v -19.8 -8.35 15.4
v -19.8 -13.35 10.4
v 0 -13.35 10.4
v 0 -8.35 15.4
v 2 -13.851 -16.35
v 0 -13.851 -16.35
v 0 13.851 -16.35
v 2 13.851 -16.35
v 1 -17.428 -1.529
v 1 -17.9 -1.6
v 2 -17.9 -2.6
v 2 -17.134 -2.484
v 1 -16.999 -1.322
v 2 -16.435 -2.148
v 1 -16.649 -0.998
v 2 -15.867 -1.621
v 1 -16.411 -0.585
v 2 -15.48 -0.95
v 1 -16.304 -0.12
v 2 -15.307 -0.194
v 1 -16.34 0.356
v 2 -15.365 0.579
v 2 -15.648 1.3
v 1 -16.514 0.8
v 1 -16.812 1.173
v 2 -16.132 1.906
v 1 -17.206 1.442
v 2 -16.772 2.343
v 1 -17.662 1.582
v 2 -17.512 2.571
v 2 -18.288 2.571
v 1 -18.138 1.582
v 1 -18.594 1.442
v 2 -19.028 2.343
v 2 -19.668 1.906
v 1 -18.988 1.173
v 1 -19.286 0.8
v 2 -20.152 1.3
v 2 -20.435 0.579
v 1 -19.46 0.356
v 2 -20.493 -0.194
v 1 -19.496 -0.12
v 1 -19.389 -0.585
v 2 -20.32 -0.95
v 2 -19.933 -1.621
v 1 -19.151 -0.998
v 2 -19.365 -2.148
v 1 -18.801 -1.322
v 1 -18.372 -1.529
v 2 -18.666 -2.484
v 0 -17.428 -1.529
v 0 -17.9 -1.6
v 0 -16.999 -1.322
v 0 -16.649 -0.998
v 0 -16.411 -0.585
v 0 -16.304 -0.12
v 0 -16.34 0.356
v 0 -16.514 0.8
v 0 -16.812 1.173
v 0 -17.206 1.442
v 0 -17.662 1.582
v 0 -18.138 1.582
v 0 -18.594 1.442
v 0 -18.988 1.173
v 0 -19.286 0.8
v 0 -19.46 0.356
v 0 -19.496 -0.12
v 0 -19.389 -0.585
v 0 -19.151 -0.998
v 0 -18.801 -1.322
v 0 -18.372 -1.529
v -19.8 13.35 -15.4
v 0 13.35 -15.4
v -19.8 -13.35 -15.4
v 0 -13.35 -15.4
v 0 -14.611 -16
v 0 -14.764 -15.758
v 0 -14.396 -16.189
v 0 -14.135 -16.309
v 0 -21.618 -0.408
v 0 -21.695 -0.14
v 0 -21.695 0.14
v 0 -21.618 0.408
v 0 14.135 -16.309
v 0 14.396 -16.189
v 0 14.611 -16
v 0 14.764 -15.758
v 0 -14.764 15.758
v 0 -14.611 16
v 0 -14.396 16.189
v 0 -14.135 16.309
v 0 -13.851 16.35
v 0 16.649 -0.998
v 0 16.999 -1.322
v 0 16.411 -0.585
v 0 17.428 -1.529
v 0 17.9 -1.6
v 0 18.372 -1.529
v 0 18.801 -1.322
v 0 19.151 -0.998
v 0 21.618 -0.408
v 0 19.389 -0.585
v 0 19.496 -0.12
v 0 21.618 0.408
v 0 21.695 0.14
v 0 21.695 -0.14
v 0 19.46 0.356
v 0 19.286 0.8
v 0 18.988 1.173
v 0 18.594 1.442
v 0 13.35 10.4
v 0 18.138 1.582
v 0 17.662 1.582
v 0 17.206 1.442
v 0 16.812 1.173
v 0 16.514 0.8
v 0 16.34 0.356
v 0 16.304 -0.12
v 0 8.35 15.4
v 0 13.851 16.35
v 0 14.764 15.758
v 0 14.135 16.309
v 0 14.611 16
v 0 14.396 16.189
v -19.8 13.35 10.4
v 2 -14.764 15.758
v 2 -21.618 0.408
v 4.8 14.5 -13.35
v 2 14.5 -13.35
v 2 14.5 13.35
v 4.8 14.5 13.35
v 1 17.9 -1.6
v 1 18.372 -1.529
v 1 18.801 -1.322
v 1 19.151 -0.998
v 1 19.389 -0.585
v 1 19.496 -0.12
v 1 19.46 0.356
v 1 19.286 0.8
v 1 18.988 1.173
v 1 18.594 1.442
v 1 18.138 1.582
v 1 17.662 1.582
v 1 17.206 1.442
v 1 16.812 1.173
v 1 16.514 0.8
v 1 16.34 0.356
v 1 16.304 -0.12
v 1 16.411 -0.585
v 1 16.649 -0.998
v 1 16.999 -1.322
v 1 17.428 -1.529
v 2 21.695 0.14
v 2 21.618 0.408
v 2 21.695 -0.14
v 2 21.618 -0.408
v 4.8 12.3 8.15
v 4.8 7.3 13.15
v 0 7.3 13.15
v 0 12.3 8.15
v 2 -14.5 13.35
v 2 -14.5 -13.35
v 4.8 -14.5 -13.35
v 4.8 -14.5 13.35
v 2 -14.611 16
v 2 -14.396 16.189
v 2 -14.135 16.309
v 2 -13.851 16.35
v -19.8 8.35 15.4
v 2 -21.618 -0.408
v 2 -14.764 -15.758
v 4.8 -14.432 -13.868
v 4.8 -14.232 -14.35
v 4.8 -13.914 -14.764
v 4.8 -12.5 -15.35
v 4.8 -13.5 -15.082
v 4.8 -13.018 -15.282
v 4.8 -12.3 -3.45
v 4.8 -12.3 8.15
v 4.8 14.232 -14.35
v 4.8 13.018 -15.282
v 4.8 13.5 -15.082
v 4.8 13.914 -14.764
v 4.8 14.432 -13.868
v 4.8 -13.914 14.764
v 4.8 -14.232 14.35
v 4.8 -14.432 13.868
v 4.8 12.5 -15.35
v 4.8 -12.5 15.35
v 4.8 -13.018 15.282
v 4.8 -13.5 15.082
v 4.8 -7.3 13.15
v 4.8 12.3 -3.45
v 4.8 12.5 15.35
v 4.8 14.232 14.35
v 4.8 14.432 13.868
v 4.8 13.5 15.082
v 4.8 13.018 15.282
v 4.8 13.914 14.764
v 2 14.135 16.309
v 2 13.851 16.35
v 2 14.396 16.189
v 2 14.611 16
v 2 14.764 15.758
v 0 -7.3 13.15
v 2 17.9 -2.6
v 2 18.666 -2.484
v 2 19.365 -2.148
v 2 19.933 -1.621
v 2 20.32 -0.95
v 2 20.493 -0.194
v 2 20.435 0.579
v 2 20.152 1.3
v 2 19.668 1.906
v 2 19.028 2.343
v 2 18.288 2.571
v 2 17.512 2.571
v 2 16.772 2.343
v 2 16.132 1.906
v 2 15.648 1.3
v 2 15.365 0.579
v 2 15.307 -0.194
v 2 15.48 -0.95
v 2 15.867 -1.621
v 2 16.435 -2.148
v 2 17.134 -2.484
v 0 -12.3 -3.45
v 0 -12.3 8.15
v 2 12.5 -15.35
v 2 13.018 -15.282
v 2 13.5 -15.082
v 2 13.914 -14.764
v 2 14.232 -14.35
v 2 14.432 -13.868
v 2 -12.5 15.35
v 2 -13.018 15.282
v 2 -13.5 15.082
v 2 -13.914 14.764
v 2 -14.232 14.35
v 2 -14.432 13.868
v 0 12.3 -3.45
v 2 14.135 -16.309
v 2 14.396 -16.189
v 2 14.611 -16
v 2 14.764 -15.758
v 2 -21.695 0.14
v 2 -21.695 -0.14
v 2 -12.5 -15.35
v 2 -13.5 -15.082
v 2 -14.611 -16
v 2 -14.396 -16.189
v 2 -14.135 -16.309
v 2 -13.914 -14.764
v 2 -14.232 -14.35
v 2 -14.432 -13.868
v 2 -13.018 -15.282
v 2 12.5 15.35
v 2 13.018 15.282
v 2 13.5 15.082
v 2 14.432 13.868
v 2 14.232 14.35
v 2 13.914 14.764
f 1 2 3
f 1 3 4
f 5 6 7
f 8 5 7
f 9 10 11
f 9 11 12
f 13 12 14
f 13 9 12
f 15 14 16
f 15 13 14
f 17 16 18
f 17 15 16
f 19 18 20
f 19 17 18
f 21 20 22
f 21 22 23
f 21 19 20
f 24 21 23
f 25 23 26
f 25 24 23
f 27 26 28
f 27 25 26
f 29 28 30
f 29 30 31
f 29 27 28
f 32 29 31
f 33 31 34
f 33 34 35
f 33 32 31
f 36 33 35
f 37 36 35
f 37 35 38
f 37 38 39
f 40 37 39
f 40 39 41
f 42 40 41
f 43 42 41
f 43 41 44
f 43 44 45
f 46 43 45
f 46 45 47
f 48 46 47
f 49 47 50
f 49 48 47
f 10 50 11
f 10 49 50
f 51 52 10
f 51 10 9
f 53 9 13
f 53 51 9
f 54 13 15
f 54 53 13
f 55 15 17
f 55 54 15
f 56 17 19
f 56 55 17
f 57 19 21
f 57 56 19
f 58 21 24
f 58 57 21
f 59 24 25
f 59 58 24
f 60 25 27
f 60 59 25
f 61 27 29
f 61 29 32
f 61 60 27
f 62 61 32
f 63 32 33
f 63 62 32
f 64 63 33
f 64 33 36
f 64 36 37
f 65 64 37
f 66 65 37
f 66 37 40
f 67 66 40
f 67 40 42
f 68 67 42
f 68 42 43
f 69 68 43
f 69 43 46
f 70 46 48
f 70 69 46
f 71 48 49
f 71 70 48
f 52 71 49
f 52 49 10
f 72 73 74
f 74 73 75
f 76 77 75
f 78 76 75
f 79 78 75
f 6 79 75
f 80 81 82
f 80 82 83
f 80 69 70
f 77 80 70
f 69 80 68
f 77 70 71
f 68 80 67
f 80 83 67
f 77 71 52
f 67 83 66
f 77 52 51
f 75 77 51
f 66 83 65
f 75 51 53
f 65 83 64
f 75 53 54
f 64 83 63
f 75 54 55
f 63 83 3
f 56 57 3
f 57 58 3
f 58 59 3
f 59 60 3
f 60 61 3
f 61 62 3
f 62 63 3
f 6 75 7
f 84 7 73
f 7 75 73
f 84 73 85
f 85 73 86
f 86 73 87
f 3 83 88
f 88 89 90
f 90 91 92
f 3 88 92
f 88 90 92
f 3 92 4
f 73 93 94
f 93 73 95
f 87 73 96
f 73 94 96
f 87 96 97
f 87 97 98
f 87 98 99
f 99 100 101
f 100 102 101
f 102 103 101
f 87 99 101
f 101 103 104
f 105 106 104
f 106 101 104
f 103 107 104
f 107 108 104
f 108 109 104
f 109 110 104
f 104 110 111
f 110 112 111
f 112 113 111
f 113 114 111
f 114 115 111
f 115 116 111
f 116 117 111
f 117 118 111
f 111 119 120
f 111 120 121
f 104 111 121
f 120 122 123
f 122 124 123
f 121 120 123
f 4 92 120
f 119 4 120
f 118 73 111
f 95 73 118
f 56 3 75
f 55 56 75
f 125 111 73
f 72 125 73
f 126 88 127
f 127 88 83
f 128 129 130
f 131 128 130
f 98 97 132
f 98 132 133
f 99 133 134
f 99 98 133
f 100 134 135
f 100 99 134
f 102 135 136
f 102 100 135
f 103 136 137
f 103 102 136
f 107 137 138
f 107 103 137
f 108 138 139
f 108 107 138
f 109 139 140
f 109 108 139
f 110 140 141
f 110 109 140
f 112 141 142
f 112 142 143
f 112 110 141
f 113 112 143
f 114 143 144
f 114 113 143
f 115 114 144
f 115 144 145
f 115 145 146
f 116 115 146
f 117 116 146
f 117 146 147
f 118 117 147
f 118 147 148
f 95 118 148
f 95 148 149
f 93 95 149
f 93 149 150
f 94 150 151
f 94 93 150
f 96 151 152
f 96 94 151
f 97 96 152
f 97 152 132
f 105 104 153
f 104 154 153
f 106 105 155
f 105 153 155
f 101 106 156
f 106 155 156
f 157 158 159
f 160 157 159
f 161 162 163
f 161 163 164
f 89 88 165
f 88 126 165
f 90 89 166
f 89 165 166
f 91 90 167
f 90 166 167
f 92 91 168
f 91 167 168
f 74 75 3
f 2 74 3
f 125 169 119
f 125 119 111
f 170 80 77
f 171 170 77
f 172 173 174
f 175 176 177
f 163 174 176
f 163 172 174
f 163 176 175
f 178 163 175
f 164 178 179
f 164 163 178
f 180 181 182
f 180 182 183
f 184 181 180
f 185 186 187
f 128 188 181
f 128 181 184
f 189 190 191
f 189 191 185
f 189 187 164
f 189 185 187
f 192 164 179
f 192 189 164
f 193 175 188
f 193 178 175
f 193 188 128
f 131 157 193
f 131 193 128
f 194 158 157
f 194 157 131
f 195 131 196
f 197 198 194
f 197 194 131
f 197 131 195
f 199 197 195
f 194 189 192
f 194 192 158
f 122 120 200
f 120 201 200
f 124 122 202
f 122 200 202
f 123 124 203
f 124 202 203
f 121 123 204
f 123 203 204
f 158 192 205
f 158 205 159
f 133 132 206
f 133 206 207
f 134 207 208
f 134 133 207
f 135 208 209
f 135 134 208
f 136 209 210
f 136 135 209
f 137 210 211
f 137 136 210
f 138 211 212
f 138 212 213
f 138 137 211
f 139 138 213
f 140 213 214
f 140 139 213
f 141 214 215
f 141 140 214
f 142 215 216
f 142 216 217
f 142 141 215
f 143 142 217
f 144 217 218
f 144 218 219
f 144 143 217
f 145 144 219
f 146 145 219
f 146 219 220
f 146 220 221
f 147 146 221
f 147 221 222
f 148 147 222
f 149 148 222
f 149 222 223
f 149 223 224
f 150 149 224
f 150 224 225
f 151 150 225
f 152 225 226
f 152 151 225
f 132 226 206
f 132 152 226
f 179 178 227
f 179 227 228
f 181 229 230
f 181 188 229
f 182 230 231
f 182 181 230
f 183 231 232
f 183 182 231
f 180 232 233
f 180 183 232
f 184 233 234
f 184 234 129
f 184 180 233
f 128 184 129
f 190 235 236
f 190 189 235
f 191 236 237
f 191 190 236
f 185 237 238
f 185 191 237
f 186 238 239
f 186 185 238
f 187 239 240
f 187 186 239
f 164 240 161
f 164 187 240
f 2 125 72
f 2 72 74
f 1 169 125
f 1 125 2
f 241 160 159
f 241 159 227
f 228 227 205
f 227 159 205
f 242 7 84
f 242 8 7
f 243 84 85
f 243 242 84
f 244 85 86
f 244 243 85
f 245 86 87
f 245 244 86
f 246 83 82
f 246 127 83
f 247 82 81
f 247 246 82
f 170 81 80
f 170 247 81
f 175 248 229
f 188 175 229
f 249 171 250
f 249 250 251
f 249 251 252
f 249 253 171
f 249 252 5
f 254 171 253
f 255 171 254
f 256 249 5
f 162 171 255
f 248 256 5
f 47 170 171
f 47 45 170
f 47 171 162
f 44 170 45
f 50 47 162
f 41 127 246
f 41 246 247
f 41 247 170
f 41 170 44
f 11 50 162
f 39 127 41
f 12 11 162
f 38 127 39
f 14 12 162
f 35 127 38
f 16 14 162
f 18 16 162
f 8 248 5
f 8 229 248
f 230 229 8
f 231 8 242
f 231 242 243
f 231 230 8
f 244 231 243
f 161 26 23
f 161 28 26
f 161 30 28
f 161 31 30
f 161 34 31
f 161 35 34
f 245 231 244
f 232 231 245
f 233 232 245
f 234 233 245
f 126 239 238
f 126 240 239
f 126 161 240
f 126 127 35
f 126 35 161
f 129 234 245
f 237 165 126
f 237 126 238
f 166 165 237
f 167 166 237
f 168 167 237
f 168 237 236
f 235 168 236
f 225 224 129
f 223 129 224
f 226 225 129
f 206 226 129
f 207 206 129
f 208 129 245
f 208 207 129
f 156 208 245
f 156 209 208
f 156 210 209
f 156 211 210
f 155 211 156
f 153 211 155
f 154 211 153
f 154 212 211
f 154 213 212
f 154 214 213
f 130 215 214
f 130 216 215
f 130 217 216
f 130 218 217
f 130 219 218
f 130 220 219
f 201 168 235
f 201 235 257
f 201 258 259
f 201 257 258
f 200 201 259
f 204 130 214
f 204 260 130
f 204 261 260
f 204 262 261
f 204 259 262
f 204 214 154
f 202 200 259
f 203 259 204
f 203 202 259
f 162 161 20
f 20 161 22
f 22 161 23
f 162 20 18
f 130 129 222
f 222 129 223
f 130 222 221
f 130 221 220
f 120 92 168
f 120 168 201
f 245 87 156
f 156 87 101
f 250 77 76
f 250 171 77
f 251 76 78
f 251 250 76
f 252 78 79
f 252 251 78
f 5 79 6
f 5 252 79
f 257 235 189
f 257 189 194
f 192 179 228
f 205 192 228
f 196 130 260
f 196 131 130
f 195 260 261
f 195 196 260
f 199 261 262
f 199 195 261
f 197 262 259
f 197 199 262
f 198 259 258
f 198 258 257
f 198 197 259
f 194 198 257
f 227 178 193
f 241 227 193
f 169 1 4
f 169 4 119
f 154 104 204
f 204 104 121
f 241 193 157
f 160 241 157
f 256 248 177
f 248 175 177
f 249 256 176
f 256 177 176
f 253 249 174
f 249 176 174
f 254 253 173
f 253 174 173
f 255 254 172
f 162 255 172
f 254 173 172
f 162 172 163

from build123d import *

# Parameters (mm, degrees)
SKETCH1_R           = 1.6
SKETCH1_W           = 29
SKETCH1_H           = 32.7
BOSS_EXTRUDE1_DEPTH = 2
SKETCH2_W           = 29
SKETCH2_H           = 30.7
BOSS_EXTRUDE2_DEPTH = 2.8
SKETCH3_W           = 24.6
SKETCH3_H           = 16.6
CUT_EXTRUDE1_DEPTH  = 28.669522945
CHAMFER1_SIZE       = 1
CHAMFER2_SIZE       = 5
BOSS_EXTRUDE3_DEPTH = 19.8
FILLET1_R           = 1
FILLET2_R           = 2


with BuildPart() as part:
    # Sketch1 → Boss-Extrude1 (new body)
    # profile 1 of 3: a face of its own
    with BuildSketch(Plane.YZ):
        Polygon((14.5, -16.35), (21.8, 0), (14.5, 16.35), align=None)
        with Locations(Location((17.9, 0, 0), (0, 0, 270))):
            Circle(SKETCH1_R, mode=Mode.SUBTRACT)
    # profile 2 of 3: a face of its own
    with BuildSketch(Plane.YZ):
        Rectangle(SKETCH1_W, SKETCH1_H)
    # profile 3 of 3: a face of its own
    with BuildSketch(Plane.YZ):
        Polygon((-14.5, 16.35), (-21.8, 0), (-14.5, -16.35), align=None)
        with Locations(Location((-17.9, 0, 0), (0, 0, 270))):
            Circle(SKETCH1_R, mode=Mode.SUBTRACT)
    extrude(amount=BOSS_EXTRUDE1_DEPTH)

    # Sketch2 → Boss-Extrude2 (add)
    with BuildSketch(Plane.YZ.offset(2)):
        Rectangle(SKETCH2_W, SKETCH2_H)
    extrude(amount=BOSS_EXTRUDE2_DEPTH)

    # Sketch3 → Cut-Extrude1 (cut, through all)
    with BuildSketch(Plane.YZ.offset(4.8)):
        with Locations((0, 4.85)):
            Rectangle(SKETCH3_W, SKETCH3_H)
    extrude(amount=-CUT_EXTRUDE1_DEPTH, mode=Mode.SUBTRACT)

    # Chamfer1
    chamfer1_edges = [part.edges().sort_by_distance(p)[0] for p in [
        (2, -17.9, 1.6),
        (2, 17.9, 1.6),
    ]]
    chamfer(chamfer1_edges, length=CHAMFER1_SIZE)

    # Chamfer2
    chamfer2_edges = [part.edges().sort_by_distance(p)[0] for p in [
        (2.4, 12.3, 13.15),
        (2.4, -12.3, 13.15),
    ]]
    chamfer(chamfer2_edges, length=CHAMFER2_SIZE)

    # Sketch4 → Boss-Extrude3 (add)
    with BuildSketch(Plane(origin=(0, 0, 0), x_dir=(0, -1, 0), z_dir=(-1, 0, 0))):
        Polygon((-13.35, 10.4), (-13.35, -15.4), (13.35, -15.4), (13.35, 10.4), (8.35, 15.4), (-8.35, 15.4), align=None)
    extrude(amount=BOSS_EXTRUDE3_DEPTH)

    # Fillet1
    fillet1_edges = [part.edges().sort_by_distance(p)[0] for p in [
        (1, 14.5, -16.35),
        (1, -14.5, -16.35),
        (1, -21.8, 0),
        (1, -14.5, 16.35),
        (1, 14.5, 16.35),
        (1, 21.8, 0),
    ]]
    fillet(fillet1_edges, radius=FILLET1_R)

    # Fillet2
    fillet2_edges = [part.edges().sort_by_distance(p)[0] for p in [
        (3.4, -14.5, 15.35),
        (3.4, -14.5, -15.35),
        (3.4, 14.5, -15.35),
        (3.4, 14.5, 15.35),
    ]]
    fillet(fillet2_edges, radius=FILLET2_R)


solid = part.part
